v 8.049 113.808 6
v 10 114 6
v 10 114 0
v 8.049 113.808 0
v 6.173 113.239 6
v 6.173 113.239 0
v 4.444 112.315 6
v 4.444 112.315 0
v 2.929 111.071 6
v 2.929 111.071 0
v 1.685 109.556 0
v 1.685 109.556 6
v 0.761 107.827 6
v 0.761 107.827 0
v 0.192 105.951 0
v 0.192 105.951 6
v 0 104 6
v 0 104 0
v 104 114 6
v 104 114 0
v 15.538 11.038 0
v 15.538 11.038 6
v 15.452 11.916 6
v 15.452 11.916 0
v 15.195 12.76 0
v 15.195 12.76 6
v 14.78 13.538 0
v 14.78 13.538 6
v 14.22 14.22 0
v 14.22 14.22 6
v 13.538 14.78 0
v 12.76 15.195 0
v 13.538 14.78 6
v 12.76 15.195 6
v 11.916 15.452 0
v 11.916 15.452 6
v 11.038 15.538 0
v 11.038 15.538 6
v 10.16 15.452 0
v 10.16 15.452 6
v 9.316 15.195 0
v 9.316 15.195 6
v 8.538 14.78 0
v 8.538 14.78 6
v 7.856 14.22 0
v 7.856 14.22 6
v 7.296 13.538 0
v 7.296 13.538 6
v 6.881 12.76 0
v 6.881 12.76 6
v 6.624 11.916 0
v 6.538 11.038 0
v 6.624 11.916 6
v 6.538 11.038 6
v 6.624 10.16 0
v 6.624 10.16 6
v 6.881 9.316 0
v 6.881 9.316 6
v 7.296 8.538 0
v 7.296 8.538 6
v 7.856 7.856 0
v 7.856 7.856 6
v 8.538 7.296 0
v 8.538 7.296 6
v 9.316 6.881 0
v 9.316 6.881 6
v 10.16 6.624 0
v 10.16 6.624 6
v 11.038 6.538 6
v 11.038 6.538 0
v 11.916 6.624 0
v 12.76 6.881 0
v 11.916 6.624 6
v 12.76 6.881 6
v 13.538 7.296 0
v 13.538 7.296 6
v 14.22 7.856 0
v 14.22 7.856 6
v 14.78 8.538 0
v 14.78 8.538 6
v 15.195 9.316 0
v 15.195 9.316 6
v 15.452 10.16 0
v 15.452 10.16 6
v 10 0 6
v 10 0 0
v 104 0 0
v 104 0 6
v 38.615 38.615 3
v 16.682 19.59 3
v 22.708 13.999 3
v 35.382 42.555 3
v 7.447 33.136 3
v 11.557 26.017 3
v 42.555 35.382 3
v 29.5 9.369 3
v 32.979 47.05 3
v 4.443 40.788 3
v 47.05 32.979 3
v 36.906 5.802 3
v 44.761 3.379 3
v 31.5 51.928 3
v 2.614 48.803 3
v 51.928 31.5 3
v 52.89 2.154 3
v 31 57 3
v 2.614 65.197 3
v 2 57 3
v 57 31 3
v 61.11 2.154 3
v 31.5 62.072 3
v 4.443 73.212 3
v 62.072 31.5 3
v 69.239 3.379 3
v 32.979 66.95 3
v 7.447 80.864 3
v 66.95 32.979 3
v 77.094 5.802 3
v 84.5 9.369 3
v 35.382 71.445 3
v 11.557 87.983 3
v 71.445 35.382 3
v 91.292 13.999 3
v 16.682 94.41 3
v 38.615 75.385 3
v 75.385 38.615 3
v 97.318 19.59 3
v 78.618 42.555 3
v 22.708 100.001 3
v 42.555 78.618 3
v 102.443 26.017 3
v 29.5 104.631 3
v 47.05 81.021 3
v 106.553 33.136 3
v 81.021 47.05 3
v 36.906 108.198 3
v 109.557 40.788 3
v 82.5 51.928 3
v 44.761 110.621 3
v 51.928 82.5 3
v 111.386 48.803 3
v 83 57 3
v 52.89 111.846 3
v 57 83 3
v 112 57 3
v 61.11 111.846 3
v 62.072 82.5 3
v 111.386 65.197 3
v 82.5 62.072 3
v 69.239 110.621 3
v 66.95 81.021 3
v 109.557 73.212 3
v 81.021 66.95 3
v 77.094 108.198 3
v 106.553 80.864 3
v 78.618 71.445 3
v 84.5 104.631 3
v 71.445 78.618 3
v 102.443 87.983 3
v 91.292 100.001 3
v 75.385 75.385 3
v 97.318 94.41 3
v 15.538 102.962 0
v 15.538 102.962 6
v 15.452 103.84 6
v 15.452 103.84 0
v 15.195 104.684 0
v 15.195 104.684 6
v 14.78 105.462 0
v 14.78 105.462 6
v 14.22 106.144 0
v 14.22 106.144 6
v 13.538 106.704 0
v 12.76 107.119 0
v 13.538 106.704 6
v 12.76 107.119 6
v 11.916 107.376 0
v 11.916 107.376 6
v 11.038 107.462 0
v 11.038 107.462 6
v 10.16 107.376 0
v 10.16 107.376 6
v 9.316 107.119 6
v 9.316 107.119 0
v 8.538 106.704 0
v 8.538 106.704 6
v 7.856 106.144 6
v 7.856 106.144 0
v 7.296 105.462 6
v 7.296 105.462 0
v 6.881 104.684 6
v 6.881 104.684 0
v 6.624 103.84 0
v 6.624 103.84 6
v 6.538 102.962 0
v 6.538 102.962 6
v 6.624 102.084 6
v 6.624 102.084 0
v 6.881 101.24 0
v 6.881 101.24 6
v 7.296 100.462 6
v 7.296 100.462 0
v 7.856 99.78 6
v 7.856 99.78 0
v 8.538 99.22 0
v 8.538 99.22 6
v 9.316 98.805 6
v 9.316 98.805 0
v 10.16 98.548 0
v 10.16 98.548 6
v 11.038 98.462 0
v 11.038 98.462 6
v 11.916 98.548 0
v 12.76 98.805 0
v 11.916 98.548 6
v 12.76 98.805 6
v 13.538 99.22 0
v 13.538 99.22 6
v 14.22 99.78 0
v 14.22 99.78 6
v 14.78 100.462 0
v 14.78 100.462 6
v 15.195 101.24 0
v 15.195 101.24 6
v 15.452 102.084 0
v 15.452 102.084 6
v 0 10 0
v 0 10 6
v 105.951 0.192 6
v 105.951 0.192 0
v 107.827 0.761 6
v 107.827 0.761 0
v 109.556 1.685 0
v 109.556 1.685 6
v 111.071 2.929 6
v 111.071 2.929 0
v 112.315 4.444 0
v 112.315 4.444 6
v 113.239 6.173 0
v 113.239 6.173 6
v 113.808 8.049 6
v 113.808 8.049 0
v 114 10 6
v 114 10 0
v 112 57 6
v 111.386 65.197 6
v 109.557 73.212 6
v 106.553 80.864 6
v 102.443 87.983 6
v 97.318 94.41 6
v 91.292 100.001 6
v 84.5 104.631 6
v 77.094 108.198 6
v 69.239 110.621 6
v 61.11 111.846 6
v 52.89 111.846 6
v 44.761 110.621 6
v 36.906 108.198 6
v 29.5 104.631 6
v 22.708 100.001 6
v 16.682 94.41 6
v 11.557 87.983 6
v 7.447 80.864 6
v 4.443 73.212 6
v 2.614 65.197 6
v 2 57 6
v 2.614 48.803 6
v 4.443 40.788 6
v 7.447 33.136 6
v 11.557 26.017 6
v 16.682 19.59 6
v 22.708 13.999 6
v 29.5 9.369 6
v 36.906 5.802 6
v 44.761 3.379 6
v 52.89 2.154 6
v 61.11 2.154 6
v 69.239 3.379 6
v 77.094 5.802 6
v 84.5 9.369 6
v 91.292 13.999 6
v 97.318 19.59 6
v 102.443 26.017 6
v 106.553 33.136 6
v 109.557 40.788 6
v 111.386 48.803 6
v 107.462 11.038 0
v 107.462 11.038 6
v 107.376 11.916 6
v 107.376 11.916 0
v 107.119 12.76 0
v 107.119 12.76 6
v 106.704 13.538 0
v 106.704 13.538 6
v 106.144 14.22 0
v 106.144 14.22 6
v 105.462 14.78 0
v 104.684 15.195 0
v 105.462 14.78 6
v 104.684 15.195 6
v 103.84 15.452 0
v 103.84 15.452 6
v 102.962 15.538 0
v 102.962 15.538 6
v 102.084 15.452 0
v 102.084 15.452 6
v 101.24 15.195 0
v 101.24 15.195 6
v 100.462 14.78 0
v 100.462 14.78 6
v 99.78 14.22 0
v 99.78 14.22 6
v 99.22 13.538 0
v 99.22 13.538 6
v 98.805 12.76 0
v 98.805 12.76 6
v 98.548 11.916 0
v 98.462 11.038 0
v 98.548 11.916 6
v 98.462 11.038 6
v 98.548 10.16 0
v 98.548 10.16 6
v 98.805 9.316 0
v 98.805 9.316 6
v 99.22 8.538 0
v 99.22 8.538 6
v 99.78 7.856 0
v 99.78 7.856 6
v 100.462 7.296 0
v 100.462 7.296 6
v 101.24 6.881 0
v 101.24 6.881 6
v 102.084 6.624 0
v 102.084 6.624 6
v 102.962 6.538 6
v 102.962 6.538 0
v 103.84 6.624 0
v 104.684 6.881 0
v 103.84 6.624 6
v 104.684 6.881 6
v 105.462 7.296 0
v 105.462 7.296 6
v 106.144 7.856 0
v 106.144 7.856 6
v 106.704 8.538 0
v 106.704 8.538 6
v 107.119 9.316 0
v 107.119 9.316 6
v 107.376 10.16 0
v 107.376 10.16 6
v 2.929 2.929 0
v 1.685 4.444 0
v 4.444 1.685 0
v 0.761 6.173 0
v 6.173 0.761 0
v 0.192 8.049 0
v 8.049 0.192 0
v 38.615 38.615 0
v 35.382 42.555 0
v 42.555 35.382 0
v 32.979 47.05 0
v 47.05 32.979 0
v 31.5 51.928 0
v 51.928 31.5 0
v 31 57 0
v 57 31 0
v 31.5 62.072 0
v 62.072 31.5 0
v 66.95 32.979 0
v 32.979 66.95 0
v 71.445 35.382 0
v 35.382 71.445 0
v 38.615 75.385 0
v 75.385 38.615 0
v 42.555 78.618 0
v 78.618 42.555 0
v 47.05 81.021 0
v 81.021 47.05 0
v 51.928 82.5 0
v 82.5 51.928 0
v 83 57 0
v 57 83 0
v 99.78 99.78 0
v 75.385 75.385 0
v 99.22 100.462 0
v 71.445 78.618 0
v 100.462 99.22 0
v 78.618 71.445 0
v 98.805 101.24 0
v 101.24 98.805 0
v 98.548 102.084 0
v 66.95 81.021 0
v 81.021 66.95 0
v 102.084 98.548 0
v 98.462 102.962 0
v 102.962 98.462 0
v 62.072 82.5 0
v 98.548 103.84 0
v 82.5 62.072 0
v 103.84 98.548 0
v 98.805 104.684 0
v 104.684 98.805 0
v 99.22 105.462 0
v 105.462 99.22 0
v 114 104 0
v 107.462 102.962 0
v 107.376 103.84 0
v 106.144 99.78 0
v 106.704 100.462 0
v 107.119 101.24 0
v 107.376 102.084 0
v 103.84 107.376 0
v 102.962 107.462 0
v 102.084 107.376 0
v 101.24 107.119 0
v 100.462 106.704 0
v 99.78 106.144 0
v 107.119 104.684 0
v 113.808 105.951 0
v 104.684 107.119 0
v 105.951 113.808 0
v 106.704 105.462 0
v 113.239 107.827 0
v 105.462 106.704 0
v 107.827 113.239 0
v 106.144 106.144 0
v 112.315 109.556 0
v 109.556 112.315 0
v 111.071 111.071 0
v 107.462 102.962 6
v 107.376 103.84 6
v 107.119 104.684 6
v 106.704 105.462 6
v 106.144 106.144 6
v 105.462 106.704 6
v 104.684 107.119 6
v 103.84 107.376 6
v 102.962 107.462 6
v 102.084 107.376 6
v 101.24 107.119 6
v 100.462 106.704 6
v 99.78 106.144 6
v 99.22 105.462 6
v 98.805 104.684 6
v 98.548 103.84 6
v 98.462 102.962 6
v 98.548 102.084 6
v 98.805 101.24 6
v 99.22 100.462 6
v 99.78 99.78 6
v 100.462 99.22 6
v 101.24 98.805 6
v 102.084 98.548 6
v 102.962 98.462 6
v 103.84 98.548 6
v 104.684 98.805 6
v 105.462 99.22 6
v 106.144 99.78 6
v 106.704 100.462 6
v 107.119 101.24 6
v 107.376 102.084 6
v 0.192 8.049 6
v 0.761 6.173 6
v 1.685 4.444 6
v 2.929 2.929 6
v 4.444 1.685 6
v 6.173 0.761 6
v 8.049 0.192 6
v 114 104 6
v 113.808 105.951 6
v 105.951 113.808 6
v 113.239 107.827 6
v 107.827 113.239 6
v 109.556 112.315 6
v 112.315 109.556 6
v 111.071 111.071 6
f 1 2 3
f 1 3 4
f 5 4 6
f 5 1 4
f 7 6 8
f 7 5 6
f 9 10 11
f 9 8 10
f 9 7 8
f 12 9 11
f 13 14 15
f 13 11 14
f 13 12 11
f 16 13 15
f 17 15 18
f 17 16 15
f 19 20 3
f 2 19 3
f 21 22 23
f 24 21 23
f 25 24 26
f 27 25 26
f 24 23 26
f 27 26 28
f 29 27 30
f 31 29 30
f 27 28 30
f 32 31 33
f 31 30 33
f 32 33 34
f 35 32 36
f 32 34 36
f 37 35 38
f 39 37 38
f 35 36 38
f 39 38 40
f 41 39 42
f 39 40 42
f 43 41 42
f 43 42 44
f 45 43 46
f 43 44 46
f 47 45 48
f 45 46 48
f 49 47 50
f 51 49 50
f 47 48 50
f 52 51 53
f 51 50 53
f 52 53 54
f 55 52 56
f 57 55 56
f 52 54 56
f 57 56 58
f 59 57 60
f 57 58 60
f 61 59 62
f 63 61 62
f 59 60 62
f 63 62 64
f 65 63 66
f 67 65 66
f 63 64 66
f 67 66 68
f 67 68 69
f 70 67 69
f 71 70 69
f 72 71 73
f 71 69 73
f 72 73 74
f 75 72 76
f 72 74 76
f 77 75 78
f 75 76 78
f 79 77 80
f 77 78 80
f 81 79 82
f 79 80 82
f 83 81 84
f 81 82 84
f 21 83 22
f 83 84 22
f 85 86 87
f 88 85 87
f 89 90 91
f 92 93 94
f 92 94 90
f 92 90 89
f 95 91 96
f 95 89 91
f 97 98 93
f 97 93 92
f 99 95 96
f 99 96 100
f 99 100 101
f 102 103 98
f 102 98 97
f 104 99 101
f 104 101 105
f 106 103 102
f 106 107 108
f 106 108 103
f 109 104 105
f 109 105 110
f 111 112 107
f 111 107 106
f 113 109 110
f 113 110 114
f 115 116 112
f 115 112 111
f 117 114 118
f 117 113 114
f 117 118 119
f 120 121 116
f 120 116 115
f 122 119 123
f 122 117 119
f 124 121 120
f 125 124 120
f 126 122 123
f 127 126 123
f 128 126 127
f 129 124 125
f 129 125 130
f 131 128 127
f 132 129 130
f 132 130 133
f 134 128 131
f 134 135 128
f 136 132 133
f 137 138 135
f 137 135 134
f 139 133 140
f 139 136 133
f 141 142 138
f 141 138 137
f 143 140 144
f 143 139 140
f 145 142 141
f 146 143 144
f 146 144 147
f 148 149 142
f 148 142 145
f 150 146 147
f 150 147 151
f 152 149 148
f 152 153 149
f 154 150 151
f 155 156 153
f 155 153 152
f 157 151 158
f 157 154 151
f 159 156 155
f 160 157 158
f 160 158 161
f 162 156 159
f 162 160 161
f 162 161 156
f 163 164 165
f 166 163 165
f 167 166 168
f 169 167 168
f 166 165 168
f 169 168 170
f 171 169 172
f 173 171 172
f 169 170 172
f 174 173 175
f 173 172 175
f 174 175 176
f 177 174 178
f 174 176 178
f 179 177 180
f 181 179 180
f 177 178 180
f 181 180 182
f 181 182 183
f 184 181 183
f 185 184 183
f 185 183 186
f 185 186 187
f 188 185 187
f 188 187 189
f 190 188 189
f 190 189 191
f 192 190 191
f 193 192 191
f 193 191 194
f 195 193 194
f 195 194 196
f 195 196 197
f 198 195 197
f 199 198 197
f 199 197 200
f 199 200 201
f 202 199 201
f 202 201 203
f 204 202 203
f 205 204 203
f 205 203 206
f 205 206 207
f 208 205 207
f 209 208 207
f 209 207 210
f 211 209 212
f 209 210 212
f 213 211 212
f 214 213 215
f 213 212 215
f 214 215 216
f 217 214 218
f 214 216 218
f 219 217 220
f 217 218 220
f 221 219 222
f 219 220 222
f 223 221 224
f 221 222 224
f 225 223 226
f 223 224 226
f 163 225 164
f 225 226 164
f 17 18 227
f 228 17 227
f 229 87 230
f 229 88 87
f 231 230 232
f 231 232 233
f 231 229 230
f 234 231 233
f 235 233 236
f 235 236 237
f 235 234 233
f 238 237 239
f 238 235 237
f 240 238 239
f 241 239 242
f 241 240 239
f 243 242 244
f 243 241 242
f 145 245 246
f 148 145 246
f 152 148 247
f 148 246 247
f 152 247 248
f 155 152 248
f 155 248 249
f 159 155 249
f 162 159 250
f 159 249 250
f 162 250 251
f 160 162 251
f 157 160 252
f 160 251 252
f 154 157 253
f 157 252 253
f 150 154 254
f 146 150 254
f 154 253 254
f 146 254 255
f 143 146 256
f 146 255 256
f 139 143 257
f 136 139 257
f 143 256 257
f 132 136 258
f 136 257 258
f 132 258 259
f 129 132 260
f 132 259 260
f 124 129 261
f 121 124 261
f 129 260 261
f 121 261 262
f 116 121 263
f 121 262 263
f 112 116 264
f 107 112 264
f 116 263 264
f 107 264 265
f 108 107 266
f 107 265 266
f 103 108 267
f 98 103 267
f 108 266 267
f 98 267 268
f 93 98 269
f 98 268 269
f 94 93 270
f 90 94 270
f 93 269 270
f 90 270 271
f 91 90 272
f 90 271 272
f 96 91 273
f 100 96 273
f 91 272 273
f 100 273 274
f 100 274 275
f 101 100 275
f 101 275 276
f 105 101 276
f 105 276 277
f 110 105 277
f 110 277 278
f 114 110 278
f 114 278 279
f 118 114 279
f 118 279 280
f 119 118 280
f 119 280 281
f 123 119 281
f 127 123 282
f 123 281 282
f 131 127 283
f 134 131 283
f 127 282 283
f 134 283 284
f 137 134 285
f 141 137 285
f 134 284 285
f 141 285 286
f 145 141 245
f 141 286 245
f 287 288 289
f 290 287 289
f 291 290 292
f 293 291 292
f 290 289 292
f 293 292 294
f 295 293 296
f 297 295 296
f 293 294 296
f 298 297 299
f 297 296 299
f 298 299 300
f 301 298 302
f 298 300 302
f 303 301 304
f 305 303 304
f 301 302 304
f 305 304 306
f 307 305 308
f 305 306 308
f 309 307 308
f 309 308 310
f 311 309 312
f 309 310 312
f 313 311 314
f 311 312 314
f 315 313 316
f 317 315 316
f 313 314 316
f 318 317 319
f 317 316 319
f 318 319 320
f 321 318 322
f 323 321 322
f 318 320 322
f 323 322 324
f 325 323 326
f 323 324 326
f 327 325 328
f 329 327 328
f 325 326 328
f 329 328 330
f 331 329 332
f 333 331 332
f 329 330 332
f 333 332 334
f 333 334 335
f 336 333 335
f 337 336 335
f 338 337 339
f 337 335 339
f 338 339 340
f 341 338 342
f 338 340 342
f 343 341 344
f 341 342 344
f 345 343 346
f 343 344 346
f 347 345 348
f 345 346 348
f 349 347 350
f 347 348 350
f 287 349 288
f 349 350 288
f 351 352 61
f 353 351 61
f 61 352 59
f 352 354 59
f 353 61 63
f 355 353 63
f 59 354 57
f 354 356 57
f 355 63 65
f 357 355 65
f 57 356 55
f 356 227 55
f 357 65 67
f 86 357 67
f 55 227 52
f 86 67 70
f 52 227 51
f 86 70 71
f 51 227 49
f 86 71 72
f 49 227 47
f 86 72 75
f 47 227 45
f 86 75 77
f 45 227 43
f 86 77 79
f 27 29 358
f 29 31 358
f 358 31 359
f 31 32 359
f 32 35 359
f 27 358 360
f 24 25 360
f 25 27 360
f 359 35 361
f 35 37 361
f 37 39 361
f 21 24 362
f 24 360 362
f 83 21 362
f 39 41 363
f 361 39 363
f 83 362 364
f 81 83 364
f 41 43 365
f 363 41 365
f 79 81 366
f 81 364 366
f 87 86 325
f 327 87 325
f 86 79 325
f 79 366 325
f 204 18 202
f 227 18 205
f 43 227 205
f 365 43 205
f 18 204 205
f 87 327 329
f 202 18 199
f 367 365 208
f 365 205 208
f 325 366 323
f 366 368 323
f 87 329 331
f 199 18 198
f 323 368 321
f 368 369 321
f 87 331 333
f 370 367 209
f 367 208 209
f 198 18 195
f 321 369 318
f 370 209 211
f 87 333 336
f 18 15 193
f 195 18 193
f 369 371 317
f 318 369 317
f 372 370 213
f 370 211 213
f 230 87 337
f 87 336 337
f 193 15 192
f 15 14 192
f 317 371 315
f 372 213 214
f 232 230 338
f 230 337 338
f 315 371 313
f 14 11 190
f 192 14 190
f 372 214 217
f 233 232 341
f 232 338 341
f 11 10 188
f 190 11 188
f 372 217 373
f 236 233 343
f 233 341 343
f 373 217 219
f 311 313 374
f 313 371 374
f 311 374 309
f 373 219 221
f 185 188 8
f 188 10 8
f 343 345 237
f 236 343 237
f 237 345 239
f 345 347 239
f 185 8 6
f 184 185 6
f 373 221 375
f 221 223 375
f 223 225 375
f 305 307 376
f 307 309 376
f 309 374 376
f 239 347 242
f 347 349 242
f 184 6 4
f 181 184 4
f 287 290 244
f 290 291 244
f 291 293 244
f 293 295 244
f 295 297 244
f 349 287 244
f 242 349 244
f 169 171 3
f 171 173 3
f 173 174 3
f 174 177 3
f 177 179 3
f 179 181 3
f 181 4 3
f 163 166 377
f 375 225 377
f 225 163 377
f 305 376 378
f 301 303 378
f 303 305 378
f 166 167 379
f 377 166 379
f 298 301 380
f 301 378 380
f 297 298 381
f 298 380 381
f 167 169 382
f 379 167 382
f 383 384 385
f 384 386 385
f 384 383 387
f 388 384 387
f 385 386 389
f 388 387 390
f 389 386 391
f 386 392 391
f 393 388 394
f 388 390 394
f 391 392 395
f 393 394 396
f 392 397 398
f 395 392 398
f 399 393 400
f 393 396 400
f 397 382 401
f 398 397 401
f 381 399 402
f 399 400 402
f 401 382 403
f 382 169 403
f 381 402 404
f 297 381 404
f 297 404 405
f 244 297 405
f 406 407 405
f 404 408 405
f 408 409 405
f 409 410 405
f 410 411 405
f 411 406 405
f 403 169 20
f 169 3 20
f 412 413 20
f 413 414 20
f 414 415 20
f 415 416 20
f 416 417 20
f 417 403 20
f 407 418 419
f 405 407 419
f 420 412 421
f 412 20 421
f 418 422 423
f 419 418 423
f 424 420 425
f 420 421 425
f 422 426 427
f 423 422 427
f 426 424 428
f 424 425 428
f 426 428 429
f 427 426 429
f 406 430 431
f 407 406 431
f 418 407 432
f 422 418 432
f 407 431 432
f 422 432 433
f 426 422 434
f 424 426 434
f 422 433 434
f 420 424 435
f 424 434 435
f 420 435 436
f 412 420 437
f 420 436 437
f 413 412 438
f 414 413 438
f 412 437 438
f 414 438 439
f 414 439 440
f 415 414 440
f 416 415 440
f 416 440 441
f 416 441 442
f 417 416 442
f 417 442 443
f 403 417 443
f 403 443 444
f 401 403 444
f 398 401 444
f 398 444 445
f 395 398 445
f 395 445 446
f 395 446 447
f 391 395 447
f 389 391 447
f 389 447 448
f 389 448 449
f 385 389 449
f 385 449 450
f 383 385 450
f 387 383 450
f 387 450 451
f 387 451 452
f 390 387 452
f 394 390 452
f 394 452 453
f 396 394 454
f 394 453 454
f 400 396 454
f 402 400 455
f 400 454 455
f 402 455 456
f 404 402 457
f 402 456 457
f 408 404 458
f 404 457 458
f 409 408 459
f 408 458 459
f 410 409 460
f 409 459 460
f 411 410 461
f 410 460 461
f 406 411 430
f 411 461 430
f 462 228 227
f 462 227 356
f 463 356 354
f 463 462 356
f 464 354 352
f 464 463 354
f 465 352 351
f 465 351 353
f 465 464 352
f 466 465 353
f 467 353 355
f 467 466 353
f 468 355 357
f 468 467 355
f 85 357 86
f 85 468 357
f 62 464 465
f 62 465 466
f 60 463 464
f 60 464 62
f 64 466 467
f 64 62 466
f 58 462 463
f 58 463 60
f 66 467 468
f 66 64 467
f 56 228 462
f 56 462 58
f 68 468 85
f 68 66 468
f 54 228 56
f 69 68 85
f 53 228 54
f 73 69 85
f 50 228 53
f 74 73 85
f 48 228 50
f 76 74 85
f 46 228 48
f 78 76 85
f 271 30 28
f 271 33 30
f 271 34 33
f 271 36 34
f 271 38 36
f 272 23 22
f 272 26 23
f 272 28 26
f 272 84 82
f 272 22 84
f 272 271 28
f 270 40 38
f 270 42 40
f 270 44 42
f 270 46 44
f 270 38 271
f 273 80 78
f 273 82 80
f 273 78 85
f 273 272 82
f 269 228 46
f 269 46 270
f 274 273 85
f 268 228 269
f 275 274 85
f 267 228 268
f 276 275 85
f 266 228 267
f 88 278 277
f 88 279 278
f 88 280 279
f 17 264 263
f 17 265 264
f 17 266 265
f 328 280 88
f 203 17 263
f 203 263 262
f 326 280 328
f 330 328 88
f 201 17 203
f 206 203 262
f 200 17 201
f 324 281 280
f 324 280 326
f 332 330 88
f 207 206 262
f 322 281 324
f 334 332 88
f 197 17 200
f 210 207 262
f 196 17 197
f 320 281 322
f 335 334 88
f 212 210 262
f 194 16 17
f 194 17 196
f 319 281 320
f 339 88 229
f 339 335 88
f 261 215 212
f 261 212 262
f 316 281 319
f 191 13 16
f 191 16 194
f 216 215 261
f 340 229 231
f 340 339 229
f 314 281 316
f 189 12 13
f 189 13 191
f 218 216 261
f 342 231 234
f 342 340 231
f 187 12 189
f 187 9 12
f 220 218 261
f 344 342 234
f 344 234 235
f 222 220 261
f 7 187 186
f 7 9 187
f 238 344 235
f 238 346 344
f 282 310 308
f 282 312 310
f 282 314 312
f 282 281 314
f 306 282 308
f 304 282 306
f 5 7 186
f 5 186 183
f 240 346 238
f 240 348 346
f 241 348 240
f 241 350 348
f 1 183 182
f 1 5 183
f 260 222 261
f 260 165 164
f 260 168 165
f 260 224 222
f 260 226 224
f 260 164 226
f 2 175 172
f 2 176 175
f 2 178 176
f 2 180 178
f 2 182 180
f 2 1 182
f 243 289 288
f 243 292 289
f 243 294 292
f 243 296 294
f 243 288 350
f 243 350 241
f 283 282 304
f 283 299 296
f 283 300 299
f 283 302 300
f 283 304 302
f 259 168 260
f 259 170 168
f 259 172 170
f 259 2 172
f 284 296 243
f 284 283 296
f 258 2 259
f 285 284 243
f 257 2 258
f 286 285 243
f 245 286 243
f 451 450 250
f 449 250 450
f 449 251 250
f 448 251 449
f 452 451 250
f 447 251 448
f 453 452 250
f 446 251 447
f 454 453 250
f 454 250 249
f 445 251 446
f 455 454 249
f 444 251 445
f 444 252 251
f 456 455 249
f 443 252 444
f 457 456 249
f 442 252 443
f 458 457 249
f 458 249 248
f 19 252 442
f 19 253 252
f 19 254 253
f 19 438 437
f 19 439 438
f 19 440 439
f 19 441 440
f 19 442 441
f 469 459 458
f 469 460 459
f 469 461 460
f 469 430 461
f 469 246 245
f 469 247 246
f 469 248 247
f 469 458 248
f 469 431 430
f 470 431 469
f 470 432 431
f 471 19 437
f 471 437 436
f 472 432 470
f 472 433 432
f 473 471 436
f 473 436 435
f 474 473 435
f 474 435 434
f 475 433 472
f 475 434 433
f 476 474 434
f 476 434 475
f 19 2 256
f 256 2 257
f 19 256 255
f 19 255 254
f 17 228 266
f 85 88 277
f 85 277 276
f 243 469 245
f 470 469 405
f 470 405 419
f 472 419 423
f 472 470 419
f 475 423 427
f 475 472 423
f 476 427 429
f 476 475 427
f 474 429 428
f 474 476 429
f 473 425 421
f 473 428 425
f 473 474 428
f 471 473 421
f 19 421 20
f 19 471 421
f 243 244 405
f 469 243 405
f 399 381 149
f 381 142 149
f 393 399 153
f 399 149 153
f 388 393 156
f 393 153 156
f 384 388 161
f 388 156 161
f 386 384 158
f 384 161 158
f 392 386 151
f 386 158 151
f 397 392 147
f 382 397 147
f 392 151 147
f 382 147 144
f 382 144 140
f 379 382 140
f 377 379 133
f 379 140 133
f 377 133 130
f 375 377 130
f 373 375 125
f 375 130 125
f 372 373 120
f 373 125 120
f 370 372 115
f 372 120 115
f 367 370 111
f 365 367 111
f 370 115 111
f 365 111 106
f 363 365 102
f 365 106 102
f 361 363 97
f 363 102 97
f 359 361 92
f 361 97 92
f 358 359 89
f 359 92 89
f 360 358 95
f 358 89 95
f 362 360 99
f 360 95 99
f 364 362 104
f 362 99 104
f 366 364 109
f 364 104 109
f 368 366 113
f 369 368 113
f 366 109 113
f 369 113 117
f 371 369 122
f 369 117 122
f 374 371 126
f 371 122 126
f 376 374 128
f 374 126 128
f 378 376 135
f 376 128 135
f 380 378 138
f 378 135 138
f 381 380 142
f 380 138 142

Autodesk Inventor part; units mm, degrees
ref_plane "YZ Plane" through (0, 0, 0) normal (1, 0, 0) x (0, 1, 0)
ref_plane "XZ Plane" through (0, 0, 0) normal (0, 1, 0) x (-1, 0, 0)
ref_plane "XY Plane" through (0, 0, 0) normal (0, 0, 1) x (1, 0, 0)
sketch "Sketch1" plane through (0, 0, 0) normal (0, 0, 1) x (1, 0, 0)
  line L0 (0, 0) -> (114, 0)
  line L1 (114, 0) -> (114, 114)
  line L2 (114, 114) -> (0, 114)
  line L3 (0, 114) -> (0, 0)
  dimension "d0" = 114
  dimension "d1" = 114
extrude "Extrusion1" add sketch "Sketch1" along normal blind 6
sketch "Sketch2" plane through (0, 0, 6) normal (0, 0, 1) x (1, 0, 0)
  circle A0 centre (57, 57) radius 55
  line L0 (0, 114) -> (0, 0) projected
  line L1 (0, 0) -> (114, 0) projected
  dimension "d4" = 110
  dimension "d5" = 57
  dimension "d6" = 57
extrude "Extrusion2" cut sketch "Sketch2" against normal blind 3
fillet "Fillet1" radius 10 1 edges at (0, 114, 3)
fillet "Fillet2" radius 10 3 edges at (114, 114, 3) (114, 0, 3) (0, 0, 3)
sketch "Sketch3" plane through (0, 0, 6) normal (0, 0, 1) x (1, 0, 0)
  circle A0 centre (11.038, 11.038) radius 4.5
  line L0 (10, 0) -> (104, 0) projected
  line L1 (0, 104) -> (0, 10) projected
  circle A1 centre (11.038, 102.962) radius 4.5
  circle A2 centre (102.962, 102.962) radius 4.5
  circle A3 centre (102.962, 11.038) radius 4.5
  line L2 (104, 114) -> (10, 114) projected
  line L3 (114, 10) -> (114, 104) projected
  point P0 (0, 0)
  dimension "d11" = 9
  dimension "d12" = 11.038
  dimension "d13" = 11.038
  dimension "d14" = 9
  dimension "d15" = 9
  dimension "d16" = 9
  dimension "d17" = 11.038
  dimension "d18" = 11.038
  dimension "d19" = 11.038
  dimension "d20" = 11.038
  dimension "d21" = 11.038
  dimension "d22" = 11.038
extrude "Extrusion3" cut sketch "Sketch3" against normal blind 6
sketch "Sketch4" plane through (57, 57, 3) normal (0, 0, 1) x (1, 0, 0)
  circle A0 centre (0, 0) radius 26
  line L0 (-57, 47) -> (-57, -47) projected
  line L1 (-47, -57) -> (47, -57) projected
  point P0 (-57, -57)
  point P1 (0, -57)
  dimension "d25" = 52
  dimension "d26" = 57
  dimension "d27" = 57
extrude "Extrusion4" cut sketch "Sketch4" against normal blind 10
equation "\"d6\" = d5"
equation "\"d13\" = d12"
equation "\"d17\" = d12"
equation "\"d18\" = d13"
equation "\"d19\" = d18"
equation "\"d20\" = d18"
equation "\"d21\" = d19"
equation "\"d22\" = d21"
properties part number "BackPlate"
